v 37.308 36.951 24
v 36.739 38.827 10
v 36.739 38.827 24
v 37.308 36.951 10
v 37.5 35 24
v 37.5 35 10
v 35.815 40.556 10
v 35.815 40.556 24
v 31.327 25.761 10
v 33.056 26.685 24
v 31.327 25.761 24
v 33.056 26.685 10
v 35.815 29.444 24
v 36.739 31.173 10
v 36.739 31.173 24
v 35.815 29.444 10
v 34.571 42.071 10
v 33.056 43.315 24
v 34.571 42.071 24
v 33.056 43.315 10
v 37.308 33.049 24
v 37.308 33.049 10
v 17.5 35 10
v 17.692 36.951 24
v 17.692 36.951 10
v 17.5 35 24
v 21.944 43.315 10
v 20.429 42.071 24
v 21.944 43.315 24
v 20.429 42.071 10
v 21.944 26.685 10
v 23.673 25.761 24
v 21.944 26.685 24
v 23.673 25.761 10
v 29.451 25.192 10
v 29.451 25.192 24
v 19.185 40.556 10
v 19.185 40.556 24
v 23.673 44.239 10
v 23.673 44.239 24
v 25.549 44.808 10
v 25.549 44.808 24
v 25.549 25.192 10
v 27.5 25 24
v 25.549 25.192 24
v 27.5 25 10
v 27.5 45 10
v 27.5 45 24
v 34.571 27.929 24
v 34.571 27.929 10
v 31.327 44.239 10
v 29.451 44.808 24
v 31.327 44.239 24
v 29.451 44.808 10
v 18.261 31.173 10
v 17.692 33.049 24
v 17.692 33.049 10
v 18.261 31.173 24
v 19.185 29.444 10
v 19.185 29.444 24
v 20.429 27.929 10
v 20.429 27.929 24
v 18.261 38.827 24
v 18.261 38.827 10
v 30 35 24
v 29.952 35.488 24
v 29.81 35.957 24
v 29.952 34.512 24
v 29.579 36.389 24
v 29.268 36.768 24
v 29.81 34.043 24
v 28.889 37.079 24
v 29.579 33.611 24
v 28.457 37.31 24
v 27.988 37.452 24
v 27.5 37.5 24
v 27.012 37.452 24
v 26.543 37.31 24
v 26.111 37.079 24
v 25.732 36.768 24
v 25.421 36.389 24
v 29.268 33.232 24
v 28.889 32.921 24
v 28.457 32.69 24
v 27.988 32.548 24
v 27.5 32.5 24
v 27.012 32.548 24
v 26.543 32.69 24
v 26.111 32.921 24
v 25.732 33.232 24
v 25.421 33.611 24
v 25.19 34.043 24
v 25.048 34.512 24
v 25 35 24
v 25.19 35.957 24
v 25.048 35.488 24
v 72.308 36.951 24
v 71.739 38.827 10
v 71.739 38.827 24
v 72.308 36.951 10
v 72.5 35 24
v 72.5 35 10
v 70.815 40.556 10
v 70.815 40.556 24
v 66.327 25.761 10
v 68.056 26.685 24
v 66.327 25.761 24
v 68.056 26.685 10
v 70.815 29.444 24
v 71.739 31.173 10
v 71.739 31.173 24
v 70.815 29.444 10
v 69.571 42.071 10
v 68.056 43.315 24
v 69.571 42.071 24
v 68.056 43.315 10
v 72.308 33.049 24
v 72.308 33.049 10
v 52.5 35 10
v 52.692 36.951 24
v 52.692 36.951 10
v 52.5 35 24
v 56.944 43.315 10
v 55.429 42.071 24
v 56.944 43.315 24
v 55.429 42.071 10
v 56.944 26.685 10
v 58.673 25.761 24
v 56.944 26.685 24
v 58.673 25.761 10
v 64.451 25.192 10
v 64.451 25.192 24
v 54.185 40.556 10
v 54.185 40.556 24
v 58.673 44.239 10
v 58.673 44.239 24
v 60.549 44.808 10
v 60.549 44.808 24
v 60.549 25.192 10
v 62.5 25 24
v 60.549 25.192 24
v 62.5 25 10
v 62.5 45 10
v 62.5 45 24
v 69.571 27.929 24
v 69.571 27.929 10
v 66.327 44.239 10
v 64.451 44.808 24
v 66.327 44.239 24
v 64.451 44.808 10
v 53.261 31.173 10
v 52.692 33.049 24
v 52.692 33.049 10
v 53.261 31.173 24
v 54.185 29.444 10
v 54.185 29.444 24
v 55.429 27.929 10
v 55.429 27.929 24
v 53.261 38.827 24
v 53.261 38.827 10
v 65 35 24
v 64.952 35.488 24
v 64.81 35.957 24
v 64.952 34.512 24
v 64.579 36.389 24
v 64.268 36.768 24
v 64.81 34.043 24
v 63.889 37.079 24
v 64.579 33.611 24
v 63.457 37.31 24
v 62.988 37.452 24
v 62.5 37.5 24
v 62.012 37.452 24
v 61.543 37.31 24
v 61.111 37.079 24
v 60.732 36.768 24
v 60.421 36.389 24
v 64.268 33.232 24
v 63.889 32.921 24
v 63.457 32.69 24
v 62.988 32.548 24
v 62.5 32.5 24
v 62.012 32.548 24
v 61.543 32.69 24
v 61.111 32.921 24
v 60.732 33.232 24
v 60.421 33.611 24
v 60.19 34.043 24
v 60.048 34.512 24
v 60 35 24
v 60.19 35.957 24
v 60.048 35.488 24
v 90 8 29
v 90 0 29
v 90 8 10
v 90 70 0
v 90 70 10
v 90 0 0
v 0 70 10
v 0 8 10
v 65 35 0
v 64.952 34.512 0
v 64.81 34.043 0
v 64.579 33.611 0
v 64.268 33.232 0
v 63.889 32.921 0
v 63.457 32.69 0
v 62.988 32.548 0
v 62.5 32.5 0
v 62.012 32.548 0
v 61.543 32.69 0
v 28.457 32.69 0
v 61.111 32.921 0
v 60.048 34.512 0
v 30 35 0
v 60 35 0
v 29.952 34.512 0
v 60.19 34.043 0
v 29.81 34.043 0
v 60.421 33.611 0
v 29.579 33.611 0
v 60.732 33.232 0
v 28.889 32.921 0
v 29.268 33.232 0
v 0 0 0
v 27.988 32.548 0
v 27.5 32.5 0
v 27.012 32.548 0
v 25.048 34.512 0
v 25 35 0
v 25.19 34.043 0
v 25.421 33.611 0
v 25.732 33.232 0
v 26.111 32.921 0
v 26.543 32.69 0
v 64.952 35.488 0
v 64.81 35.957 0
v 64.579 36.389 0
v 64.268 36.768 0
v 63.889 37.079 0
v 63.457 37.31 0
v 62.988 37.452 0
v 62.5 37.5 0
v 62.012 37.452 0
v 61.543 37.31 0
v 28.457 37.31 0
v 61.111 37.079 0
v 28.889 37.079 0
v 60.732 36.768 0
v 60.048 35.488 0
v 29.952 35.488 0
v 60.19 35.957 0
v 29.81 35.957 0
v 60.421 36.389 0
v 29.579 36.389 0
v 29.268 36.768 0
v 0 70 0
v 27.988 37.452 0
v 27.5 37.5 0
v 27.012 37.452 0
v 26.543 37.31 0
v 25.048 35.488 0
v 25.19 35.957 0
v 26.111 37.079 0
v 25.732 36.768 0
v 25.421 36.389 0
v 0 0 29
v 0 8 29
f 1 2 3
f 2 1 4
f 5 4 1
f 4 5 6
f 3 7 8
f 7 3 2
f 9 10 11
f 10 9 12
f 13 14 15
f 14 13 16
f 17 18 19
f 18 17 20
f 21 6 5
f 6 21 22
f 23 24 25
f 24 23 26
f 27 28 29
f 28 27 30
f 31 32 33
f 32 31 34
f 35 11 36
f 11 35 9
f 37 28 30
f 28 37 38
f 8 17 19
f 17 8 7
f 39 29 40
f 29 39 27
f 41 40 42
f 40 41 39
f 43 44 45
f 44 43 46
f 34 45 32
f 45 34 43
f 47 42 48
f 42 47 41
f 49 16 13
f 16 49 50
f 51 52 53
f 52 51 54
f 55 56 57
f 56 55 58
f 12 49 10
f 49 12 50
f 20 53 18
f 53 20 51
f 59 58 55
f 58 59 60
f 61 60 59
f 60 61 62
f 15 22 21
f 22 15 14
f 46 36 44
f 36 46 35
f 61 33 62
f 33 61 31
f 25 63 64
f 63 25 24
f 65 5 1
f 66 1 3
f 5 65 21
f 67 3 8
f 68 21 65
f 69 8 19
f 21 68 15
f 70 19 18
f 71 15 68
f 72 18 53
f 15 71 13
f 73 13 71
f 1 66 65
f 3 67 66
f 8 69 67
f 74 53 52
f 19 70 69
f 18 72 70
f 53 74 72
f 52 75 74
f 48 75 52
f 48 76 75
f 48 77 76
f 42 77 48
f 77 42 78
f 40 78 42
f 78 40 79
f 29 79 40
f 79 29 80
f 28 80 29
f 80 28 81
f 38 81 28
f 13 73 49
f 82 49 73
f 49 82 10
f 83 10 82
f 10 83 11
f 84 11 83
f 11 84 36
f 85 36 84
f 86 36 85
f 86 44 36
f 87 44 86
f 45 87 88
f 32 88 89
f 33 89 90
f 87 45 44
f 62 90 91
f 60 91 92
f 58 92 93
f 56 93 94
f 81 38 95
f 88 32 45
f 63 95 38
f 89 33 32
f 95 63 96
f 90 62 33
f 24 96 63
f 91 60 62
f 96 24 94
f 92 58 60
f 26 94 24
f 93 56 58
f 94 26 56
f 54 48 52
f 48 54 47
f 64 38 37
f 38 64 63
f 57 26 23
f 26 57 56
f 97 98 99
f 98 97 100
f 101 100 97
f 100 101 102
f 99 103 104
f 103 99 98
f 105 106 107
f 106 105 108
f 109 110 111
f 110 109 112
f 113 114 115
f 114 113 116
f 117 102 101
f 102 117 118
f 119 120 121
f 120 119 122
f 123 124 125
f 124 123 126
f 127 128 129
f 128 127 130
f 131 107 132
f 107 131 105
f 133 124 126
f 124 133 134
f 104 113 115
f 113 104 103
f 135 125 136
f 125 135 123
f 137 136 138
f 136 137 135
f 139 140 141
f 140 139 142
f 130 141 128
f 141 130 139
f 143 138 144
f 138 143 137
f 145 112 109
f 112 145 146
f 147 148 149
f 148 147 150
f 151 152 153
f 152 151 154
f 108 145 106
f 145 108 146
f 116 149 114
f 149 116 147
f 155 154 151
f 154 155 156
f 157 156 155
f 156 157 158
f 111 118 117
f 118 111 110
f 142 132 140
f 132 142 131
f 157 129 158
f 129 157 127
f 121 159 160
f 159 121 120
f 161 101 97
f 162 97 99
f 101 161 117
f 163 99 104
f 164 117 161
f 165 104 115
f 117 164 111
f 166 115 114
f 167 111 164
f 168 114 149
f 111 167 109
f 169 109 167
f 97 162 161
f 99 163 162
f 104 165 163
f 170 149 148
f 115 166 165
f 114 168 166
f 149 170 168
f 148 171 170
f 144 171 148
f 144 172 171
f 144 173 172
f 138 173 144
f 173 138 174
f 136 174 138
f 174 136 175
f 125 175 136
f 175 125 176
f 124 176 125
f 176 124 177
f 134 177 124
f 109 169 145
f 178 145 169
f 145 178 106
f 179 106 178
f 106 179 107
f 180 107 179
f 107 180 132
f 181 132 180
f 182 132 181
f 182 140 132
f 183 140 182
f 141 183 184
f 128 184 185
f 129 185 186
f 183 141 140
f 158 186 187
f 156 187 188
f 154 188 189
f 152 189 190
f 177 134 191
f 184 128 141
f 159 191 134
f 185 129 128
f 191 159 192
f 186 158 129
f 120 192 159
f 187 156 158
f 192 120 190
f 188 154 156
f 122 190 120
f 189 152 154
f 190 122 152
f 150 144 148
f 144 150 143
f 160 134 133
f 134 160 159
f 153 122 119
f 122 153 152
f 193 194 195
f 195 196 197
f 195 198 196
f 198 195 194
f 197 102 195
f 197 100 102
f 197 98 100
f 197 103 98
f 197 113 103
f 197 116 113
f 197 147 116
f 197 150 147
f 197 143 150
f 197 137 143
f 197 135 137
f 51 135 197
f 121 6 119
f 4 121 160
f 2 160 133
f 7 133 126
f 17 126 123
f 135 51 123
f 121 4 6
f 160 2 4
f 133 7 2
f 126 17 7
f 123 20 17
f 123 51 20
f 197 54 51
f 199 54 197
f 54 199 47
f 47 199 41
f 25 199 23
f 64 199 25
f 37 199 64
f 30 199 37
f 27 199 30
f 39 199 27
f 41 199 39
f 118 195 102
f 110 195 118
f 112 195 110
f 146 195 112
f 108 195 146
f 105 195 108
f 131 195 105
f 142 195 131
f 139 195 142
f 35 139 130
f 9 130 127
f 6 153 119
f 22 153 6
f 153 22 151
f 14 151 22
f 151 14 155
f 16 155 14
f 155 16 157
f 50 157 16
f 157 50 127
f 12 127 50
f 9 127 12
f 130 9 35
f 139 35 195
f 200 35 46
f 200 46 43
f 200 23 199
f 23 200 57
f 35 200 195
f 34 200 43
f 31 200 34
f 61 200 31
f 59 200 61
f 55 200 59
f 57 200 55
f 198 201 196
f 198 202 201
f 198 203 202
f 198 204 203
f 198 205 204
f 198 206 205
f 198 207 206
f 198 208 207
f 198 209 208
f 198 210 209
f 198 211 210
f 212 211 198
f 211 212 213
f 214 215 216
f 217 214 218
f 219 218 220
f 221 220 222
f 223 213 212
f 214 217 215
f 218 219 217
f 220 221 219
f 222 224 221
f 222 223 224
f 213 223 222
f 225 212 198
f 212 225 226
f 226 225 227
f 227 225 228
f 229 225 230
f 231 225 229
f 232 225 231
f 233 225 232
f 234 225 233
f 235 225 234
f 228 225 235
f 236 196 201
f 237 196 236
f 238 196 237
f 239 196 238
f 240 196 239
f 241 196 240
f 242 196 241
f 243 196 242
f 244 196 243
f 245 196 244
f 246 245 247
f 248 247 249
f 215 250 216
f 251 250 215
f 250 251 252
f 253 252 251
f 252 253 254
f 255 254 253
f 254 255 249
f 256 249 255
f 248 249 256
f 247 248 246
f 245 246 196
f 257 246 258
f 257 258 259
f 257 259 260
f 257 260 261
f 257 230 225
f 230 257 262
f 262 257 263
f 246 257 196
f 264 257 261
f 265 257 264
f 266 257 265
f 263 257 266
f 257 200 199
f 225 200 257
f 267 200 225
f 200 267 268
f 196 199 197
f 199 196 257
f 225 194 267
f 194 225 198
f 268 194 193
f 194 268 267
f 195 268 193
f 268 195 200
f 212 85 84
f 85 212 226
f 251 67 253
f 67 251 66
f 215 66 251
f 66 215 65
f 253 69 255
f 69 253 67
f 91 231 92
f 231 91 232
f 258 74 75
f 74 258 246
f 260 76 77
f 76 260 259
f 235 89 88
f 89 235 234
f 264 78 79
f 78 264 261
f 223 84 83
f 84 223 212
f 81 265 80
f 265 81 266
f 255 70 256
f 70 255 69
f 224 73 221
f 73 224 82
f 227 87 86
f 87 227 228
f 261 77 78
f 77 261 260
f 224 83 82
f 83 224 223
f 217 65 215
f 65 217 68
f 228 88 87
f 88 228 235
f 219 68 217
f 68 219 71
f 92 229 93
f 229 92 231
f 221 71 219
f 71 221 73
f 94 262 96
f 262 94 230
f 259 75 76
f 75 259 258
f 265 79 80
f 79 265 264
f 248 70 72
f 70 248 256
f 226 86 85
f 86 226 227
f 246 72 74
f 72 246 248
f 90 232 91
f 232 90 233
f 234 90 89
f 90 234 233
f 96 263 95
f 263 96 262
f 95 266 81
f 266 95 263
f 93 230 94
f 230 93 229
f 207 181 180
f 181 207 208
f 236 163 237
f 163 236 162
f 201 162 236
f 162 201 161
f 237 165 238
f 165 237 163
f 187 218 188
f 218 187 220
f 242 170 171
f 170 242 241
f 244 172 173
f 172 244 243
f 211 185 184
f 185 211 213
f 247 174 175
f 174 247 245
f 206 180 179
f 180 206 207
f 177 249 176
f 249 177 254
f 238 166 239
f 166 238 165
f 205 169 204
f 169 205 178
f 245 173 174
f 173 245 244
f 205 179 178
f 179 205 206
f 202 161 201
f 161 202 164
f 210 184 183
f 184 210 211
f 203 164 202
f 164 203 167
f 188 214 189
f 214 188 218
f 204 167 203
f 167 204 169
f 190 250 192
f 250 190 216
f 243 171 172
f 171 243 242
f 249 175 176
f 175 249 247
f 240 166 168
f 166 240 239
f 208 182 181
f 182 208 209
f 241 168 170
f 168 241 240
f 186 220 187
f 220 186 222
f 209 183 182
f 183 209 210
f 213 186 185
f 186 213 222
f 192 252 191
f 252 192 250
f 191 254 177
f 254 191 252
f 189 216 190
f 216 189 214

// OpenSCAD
$fn = 32;

// ----------------------------------------------------------------------
// Drill jig: fence jig
// ----------------------------------------------------------------------

// --- parameters (mm) ---
plate_l = 90;             // plate length, X
plate_w = 70;             // plate width, Y
plate_t = 10;             // plate thickness
boss_d = 20;              // guide boss diameter
boss_h = 15;              // boss height above the plate
guide_d = 5;              // guide hole diameter
boss_pitch = 35;          // boss pitch
fence_h = 20;             // fence height above the plate
fence_t = 8;              // fence thickness

n_boss = 2;  // guide bosses
boss_x0 = (plate_l - (n_boss - 1) * boss_pitch) / 2;  // first boss X
boss_top = plate_t - 1 + boss_h;  // boss crown height
fence_top = plate_t - 1 + fence_h;  // fence crown height
total_h = max([fence_top, boss_top]);  // overall height

difference() {
  union() {
  cube([plate_l, plate_w, plate_t]);
  for (i = [0 : n_boss - 1])
    translate([boss_x0 + i * boss_pitch, plate_w / 2, plate_t - 1])
      cylinder(h = boss_h, d = boss_d);
  translate([0, 0, plate_t - 1]) cube([plate_l, fence_t, fence_h]);
  }
  for (i = [0 : n_boss - 1])
    translate([boss_x0 + i * boss_pitch, plate_w / 2, -1])
      cylinder(h = plate_t + boss_h, d = guide_d);
}
